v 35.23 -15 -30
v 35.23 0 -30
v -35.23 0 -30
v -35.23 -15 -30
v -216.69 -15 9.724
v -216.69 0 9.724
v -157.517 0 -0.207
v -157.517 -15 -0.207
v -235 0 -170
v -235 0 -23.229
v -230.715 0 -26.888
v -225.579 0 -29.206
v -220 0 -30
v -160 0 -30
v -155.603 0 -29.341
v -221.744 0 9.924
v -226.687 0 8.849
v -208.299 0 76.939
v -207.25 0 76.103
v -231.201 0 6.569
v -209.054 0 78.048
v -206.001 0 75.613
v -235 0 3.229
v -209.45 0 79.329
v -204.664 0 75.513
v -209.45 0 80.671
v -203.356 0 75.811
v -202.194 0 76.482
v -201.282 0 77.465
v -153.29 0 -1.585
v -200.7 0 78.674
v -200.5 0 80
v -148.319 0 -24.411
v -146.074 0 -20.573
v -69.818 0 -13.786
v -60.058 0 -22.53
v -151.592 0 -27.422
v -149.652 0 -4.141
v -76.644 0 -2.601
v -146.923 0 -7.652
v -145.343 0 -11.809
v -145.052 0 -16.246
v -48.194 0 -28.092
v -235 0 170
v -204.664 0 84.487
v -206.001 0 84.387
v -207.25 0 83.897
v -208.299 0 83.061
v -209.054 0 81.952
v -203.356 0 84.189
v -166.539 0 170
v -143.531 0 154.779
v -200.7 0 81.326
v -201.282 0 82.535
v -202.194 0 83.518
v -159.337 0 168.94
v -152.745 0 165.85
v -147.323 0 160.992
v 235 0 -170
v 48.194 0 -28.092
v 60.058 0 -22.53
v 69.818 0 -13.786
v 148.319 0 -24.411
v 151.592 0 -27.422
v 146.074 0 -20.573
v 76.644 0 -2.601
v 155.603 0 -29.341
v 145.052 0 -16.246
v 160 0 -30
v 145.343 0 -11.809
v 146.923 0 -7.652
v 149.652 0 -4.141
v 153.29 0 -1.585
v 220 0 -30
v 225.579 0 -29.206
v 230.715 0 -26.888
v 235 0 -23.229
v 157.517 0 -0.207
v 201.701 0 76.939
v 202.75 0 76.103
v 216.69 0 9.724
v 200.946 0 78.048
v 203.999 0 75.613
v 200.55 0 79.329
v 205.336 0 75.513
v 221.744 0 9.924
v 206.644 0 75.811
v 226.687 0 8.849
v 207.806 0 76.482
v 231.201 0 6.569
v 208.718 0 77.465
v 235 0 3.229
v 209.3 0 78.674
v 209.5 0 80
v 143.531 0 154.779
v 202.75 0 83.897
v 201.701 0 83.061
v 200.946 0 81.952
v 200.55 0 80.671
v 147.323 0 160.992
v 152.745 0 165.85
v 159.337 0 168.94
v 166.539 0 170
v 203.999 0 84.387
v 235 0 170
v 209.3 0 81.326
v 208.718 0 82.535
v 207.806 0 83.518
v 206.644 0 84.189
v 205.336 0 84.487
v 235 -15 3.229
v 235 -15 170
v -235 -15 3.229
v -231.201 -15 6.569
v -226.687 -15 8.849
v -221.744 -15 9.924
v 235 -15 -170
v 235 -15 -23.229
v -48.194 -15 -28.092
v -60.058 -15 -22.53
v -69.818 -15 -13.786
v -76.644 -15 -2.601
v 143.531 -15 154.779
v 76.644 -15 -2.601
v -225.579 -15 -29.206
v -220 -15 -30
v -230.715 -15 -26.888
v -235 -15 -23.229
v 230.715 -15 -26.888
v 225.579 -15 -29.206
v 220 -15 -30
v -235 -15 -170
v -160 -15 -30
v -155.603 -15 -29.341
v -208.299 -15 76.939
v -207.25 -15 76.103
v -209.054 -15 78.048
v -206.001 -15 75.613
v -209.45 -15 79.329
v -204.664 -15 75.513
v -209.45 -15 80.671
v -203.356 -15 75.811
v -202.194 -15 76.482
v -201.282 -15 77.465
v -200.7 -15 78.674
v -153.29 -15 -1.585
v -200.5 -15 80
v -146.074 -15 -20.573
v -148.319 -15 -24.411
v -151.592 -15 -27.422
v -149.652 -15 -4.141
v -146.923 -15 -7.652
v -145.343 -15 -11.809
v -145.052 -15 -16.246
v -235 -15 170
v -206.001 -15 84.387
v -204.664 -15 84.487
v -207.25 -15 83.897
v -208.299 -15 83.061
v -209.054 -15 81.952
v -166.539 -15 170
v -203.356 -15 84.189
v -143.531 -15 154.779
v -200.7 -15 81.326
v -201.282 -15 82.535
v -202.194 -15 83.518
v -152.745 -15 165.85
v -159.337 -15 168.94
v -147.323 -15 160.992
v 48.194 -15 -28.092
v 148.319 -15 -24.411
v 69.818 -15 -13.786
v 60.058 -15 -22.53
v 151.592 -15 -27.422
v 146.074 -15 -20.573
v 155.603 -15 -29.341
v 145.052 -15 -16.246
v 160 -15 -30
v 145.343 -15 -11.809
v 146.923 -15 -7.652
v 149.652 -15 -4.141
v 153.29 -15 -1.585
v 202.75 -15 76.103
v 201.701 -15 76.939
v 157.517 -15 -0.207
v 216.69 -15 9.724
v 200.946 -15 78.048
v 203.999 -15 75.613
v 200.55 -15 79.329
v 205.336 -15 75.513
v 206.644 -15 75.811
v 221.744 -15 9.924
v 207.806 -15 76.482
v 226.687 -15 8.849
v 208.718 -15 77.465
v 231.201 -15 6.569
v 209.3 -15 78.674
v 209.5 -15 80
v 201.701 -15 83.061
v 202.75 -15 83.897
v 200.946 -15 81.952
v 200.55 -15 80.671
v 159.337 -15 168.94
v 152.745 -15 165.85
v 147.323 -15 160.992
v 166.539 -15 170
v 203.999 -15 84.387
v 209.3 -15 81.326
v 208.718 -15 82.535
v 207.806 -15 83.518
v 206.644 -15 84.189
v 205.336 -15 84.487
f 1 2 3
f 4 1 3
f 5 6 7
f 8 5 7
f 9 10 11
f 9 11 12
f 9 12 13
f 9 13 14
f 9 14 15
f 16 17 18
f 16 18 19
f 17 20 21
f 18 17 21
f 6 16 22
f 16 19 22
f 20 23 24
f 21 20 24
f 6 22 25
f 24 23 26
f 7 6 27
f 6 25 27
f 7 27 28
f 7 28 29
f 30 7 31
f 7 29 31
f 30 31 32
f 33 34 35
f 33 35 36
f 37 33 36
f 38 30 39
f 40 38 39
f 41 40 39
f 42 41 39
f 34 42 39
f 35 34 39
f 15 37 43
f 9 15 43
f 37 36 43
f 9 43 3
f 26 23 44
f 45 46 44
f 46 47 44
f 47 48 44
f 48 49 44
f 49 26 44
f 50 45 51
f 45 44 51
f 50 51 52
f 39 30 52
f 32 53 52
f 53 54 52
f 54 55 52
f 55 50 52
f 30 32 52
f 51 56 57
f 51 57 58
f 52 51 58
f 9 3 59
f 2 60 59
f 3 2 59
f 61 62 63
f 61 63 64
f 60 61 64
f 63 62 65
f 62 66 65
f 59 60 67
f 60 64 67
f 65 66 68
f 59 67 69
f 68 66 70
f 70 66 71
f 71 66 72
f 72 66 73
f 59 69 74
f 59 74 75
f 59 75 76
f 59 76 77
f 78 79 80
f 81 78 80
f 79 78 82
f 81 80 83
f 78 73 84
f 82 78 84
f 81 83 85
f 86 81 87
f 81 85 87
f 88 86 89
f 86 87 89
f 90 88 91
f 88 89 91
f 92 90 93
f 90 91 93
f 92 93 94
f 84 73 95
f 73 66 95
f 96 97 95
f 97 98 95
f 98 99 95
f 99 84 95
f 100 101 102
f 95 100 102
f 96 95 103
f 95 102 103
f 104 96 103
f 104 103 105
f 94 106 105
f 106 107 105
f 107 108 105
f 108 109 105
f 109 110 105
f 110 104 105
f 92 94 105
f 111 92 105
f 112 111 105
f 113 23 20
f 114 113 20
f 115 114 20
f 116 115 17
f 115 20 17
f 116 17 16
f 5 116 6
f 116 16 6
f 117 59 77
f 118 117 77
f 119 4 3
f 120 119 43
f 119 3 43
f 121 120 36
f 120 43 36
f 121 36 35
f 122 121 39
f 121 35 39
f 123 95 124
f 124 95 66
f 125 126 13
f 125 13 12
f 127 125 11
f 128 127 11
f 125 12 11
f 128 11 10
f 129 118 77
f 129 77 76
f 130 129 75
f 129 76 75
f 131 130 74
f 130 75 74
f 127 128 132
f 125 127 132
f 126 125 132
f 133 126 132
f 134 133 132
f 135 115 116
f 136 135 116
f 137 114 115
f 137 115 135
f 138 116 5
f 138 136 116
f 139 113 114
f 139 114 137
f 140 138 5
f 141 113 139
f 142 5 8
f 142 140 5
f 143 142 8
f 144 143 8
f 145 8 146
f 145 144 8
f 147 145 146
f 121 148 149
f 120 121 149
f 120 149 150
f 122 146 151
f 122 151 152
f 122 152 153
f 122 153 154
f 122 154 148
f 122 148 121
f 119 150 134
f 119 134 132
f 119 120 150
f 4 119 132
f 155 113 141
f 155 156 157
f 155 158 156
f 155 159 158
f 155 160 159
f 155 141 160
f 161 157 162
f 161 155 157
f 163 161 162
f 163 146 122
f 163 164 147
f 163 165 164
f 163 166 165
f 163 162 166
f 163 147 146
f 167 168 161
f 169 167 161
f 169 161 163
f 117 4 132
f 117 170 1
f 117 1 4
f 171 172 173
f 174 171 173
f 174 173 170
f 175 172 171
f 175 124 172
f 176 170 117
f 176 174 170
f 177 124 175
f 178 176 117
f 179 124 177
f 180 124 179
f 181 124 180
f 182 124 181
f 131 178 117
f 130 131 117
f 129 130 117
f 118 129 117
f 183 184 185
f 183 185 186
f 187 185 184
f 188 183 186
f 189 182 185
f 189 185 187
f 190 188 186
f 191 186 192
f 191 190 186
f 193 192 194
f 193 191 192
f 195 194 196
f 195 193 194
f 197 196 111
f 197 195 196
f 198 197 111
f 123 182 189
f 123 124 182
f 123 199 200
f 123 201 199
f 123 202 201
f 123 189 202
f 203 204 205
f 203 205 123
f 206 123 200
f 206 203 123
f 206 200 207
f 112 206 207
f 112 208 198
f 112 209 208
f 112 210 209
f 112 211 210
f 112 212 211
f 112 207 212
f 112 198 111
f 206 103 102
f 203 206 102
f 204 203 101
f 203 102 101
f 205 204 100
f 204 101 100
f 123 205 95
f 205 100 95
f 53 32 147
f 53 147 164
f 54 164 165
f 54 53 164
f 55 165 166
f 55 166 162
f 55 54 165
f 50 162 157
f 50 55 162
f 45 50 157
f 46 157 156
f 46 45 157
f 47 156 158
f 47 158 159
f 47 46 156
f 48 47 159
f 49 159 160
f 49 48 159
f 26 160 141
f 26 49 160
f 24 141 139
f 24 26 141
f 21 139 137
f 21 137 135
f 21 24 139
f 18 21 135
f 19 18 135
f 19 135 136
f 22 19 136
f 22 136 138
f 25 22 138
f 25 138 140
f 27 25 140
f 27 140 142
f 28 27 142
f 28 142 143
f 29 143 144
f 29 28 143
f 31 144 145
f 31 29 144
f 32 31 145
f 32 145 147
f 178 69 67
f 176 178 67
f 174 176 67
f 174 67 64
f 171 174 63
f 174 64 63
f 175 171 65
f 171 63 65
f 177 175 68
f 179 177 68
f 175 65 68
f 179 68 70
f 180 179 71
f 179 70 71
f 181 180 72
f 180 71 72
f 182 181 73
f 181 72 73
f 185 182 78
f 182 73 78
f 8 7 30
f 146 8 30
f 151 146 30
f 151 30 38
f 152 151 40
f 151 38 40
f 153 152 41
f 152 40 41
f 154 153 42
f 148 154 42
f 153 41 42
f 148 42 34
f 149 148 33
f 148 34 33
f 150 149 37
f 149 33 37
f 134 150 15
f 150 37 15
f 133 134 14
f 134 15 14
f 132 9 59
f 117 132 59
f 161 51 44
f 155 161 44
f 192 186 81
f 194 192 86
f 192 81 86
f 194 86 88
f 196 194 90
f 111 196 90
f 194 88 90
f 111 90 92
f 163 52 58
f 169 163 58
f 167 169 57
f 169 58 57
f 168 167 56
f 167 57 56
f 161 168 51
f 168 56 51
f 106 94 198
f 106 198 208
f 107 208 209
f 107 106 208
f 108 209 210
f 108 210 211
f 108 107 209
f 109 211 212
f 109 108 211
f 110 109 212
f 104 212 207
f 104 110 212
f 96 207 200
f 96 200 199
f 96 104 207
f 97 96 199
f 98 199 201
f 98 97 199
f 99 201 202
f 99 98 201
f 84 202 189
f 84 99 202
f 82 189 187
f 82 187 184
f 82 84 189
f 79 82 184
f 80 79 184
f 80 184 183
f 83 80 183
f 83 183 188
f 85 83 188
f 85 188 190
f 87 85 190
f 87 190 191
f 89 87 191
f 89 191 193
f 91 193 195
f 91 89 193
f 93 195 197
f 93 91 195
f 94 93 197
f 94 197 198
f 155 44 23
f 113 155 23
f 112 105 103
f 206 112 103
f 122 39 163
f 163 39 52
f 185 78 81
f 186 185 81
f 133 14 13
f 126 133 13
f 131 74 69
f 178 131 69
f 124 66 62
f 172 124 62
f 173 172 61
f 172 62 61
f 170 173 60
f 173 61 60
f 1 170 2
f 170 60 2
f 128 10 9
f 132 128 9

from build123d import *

# Parameters (mm, degrees)
F0_R     = 4.5
F1_DEPTH = 15


with BuildPart() as f1:
    # F0 (on Front) → F1 (new body)
    with BuildSketch(Plane.XZ):
        with BuildLine():
            Line((-166.539142, 170), (-235, 170))
            Line((-235, 170), (-235, 3.228757))
            ThreePointArc((-235, 3.228757), (-226.686517, 8.849151), (-216.689655, 9.724138))
            Line((-216.689655, 9.724138), (-157.517241, -0.206897))
            ThreePointArc((-157.517241, -0.206897), (-145.051814, -16.245682), (-160, -30))
            Line((-160, -30), (-220, -30))
            ThreePointArc((-220, -30), (-228.228757, -28.228757), (-235, -23.228757))
            Line((-235, -23.228757), (-235, -170))
            Line((-235, -170), (0, -170))
            Line((0, -170), (235, -170))
            Line((235, -170), (235, -23.228757))
            ThreePointArc((235, -23.228757), (228.228757, -28.228757), (220, -30))
            Line((220, -30), (160, -30))
            ThreePointArc((160, -30), (145.051814, -16.245682), (157.517241, -0.206897))
            Line((157.517241, -0.206897), (216.689655, 9.724138))
            ThreePointArc((216.689655, 9.724138), (226.686517, 8.849151), (235, 3.228757))
            Line((235, 3.228757), (235, 170))
            Line((235, 170), (166.539142, 170))
            ThreePointArc((166.539142, 170), (152.745356, 165.850215), (143.530869, 154.778516))
            Line((143.530869, 154.778516), (76.644435, -2.601329))
            ThreePointArc((76.644435, -2.601329), (60.05836, -22.530386), (35.229544, -30))
            Line((35.229544, -30), (0, -30))
            Line((0, -30), (-35.229544, -30))
            ThreePointArc((-35.229544, -30), (-60.05836, -22.530386), (-76.644435, -2.601329))
            Line((-76.644435, -2.601329), (-143.530869, 154.778516))
            ThreePointArc((-143.530869, 154.778516), (-152.745356, 165.850215), (-166.539142, 170))
        make_face()
        with Locations((-205, 80)):
            Circle(F0_R, mode=Mode.SUBTRACT)
        with Locations((205, 80)):
            Circle(F0_R, mode=Mode.SUBTRACT)
    extrude(amount=F1_DEPTH)


solid = f1.part
